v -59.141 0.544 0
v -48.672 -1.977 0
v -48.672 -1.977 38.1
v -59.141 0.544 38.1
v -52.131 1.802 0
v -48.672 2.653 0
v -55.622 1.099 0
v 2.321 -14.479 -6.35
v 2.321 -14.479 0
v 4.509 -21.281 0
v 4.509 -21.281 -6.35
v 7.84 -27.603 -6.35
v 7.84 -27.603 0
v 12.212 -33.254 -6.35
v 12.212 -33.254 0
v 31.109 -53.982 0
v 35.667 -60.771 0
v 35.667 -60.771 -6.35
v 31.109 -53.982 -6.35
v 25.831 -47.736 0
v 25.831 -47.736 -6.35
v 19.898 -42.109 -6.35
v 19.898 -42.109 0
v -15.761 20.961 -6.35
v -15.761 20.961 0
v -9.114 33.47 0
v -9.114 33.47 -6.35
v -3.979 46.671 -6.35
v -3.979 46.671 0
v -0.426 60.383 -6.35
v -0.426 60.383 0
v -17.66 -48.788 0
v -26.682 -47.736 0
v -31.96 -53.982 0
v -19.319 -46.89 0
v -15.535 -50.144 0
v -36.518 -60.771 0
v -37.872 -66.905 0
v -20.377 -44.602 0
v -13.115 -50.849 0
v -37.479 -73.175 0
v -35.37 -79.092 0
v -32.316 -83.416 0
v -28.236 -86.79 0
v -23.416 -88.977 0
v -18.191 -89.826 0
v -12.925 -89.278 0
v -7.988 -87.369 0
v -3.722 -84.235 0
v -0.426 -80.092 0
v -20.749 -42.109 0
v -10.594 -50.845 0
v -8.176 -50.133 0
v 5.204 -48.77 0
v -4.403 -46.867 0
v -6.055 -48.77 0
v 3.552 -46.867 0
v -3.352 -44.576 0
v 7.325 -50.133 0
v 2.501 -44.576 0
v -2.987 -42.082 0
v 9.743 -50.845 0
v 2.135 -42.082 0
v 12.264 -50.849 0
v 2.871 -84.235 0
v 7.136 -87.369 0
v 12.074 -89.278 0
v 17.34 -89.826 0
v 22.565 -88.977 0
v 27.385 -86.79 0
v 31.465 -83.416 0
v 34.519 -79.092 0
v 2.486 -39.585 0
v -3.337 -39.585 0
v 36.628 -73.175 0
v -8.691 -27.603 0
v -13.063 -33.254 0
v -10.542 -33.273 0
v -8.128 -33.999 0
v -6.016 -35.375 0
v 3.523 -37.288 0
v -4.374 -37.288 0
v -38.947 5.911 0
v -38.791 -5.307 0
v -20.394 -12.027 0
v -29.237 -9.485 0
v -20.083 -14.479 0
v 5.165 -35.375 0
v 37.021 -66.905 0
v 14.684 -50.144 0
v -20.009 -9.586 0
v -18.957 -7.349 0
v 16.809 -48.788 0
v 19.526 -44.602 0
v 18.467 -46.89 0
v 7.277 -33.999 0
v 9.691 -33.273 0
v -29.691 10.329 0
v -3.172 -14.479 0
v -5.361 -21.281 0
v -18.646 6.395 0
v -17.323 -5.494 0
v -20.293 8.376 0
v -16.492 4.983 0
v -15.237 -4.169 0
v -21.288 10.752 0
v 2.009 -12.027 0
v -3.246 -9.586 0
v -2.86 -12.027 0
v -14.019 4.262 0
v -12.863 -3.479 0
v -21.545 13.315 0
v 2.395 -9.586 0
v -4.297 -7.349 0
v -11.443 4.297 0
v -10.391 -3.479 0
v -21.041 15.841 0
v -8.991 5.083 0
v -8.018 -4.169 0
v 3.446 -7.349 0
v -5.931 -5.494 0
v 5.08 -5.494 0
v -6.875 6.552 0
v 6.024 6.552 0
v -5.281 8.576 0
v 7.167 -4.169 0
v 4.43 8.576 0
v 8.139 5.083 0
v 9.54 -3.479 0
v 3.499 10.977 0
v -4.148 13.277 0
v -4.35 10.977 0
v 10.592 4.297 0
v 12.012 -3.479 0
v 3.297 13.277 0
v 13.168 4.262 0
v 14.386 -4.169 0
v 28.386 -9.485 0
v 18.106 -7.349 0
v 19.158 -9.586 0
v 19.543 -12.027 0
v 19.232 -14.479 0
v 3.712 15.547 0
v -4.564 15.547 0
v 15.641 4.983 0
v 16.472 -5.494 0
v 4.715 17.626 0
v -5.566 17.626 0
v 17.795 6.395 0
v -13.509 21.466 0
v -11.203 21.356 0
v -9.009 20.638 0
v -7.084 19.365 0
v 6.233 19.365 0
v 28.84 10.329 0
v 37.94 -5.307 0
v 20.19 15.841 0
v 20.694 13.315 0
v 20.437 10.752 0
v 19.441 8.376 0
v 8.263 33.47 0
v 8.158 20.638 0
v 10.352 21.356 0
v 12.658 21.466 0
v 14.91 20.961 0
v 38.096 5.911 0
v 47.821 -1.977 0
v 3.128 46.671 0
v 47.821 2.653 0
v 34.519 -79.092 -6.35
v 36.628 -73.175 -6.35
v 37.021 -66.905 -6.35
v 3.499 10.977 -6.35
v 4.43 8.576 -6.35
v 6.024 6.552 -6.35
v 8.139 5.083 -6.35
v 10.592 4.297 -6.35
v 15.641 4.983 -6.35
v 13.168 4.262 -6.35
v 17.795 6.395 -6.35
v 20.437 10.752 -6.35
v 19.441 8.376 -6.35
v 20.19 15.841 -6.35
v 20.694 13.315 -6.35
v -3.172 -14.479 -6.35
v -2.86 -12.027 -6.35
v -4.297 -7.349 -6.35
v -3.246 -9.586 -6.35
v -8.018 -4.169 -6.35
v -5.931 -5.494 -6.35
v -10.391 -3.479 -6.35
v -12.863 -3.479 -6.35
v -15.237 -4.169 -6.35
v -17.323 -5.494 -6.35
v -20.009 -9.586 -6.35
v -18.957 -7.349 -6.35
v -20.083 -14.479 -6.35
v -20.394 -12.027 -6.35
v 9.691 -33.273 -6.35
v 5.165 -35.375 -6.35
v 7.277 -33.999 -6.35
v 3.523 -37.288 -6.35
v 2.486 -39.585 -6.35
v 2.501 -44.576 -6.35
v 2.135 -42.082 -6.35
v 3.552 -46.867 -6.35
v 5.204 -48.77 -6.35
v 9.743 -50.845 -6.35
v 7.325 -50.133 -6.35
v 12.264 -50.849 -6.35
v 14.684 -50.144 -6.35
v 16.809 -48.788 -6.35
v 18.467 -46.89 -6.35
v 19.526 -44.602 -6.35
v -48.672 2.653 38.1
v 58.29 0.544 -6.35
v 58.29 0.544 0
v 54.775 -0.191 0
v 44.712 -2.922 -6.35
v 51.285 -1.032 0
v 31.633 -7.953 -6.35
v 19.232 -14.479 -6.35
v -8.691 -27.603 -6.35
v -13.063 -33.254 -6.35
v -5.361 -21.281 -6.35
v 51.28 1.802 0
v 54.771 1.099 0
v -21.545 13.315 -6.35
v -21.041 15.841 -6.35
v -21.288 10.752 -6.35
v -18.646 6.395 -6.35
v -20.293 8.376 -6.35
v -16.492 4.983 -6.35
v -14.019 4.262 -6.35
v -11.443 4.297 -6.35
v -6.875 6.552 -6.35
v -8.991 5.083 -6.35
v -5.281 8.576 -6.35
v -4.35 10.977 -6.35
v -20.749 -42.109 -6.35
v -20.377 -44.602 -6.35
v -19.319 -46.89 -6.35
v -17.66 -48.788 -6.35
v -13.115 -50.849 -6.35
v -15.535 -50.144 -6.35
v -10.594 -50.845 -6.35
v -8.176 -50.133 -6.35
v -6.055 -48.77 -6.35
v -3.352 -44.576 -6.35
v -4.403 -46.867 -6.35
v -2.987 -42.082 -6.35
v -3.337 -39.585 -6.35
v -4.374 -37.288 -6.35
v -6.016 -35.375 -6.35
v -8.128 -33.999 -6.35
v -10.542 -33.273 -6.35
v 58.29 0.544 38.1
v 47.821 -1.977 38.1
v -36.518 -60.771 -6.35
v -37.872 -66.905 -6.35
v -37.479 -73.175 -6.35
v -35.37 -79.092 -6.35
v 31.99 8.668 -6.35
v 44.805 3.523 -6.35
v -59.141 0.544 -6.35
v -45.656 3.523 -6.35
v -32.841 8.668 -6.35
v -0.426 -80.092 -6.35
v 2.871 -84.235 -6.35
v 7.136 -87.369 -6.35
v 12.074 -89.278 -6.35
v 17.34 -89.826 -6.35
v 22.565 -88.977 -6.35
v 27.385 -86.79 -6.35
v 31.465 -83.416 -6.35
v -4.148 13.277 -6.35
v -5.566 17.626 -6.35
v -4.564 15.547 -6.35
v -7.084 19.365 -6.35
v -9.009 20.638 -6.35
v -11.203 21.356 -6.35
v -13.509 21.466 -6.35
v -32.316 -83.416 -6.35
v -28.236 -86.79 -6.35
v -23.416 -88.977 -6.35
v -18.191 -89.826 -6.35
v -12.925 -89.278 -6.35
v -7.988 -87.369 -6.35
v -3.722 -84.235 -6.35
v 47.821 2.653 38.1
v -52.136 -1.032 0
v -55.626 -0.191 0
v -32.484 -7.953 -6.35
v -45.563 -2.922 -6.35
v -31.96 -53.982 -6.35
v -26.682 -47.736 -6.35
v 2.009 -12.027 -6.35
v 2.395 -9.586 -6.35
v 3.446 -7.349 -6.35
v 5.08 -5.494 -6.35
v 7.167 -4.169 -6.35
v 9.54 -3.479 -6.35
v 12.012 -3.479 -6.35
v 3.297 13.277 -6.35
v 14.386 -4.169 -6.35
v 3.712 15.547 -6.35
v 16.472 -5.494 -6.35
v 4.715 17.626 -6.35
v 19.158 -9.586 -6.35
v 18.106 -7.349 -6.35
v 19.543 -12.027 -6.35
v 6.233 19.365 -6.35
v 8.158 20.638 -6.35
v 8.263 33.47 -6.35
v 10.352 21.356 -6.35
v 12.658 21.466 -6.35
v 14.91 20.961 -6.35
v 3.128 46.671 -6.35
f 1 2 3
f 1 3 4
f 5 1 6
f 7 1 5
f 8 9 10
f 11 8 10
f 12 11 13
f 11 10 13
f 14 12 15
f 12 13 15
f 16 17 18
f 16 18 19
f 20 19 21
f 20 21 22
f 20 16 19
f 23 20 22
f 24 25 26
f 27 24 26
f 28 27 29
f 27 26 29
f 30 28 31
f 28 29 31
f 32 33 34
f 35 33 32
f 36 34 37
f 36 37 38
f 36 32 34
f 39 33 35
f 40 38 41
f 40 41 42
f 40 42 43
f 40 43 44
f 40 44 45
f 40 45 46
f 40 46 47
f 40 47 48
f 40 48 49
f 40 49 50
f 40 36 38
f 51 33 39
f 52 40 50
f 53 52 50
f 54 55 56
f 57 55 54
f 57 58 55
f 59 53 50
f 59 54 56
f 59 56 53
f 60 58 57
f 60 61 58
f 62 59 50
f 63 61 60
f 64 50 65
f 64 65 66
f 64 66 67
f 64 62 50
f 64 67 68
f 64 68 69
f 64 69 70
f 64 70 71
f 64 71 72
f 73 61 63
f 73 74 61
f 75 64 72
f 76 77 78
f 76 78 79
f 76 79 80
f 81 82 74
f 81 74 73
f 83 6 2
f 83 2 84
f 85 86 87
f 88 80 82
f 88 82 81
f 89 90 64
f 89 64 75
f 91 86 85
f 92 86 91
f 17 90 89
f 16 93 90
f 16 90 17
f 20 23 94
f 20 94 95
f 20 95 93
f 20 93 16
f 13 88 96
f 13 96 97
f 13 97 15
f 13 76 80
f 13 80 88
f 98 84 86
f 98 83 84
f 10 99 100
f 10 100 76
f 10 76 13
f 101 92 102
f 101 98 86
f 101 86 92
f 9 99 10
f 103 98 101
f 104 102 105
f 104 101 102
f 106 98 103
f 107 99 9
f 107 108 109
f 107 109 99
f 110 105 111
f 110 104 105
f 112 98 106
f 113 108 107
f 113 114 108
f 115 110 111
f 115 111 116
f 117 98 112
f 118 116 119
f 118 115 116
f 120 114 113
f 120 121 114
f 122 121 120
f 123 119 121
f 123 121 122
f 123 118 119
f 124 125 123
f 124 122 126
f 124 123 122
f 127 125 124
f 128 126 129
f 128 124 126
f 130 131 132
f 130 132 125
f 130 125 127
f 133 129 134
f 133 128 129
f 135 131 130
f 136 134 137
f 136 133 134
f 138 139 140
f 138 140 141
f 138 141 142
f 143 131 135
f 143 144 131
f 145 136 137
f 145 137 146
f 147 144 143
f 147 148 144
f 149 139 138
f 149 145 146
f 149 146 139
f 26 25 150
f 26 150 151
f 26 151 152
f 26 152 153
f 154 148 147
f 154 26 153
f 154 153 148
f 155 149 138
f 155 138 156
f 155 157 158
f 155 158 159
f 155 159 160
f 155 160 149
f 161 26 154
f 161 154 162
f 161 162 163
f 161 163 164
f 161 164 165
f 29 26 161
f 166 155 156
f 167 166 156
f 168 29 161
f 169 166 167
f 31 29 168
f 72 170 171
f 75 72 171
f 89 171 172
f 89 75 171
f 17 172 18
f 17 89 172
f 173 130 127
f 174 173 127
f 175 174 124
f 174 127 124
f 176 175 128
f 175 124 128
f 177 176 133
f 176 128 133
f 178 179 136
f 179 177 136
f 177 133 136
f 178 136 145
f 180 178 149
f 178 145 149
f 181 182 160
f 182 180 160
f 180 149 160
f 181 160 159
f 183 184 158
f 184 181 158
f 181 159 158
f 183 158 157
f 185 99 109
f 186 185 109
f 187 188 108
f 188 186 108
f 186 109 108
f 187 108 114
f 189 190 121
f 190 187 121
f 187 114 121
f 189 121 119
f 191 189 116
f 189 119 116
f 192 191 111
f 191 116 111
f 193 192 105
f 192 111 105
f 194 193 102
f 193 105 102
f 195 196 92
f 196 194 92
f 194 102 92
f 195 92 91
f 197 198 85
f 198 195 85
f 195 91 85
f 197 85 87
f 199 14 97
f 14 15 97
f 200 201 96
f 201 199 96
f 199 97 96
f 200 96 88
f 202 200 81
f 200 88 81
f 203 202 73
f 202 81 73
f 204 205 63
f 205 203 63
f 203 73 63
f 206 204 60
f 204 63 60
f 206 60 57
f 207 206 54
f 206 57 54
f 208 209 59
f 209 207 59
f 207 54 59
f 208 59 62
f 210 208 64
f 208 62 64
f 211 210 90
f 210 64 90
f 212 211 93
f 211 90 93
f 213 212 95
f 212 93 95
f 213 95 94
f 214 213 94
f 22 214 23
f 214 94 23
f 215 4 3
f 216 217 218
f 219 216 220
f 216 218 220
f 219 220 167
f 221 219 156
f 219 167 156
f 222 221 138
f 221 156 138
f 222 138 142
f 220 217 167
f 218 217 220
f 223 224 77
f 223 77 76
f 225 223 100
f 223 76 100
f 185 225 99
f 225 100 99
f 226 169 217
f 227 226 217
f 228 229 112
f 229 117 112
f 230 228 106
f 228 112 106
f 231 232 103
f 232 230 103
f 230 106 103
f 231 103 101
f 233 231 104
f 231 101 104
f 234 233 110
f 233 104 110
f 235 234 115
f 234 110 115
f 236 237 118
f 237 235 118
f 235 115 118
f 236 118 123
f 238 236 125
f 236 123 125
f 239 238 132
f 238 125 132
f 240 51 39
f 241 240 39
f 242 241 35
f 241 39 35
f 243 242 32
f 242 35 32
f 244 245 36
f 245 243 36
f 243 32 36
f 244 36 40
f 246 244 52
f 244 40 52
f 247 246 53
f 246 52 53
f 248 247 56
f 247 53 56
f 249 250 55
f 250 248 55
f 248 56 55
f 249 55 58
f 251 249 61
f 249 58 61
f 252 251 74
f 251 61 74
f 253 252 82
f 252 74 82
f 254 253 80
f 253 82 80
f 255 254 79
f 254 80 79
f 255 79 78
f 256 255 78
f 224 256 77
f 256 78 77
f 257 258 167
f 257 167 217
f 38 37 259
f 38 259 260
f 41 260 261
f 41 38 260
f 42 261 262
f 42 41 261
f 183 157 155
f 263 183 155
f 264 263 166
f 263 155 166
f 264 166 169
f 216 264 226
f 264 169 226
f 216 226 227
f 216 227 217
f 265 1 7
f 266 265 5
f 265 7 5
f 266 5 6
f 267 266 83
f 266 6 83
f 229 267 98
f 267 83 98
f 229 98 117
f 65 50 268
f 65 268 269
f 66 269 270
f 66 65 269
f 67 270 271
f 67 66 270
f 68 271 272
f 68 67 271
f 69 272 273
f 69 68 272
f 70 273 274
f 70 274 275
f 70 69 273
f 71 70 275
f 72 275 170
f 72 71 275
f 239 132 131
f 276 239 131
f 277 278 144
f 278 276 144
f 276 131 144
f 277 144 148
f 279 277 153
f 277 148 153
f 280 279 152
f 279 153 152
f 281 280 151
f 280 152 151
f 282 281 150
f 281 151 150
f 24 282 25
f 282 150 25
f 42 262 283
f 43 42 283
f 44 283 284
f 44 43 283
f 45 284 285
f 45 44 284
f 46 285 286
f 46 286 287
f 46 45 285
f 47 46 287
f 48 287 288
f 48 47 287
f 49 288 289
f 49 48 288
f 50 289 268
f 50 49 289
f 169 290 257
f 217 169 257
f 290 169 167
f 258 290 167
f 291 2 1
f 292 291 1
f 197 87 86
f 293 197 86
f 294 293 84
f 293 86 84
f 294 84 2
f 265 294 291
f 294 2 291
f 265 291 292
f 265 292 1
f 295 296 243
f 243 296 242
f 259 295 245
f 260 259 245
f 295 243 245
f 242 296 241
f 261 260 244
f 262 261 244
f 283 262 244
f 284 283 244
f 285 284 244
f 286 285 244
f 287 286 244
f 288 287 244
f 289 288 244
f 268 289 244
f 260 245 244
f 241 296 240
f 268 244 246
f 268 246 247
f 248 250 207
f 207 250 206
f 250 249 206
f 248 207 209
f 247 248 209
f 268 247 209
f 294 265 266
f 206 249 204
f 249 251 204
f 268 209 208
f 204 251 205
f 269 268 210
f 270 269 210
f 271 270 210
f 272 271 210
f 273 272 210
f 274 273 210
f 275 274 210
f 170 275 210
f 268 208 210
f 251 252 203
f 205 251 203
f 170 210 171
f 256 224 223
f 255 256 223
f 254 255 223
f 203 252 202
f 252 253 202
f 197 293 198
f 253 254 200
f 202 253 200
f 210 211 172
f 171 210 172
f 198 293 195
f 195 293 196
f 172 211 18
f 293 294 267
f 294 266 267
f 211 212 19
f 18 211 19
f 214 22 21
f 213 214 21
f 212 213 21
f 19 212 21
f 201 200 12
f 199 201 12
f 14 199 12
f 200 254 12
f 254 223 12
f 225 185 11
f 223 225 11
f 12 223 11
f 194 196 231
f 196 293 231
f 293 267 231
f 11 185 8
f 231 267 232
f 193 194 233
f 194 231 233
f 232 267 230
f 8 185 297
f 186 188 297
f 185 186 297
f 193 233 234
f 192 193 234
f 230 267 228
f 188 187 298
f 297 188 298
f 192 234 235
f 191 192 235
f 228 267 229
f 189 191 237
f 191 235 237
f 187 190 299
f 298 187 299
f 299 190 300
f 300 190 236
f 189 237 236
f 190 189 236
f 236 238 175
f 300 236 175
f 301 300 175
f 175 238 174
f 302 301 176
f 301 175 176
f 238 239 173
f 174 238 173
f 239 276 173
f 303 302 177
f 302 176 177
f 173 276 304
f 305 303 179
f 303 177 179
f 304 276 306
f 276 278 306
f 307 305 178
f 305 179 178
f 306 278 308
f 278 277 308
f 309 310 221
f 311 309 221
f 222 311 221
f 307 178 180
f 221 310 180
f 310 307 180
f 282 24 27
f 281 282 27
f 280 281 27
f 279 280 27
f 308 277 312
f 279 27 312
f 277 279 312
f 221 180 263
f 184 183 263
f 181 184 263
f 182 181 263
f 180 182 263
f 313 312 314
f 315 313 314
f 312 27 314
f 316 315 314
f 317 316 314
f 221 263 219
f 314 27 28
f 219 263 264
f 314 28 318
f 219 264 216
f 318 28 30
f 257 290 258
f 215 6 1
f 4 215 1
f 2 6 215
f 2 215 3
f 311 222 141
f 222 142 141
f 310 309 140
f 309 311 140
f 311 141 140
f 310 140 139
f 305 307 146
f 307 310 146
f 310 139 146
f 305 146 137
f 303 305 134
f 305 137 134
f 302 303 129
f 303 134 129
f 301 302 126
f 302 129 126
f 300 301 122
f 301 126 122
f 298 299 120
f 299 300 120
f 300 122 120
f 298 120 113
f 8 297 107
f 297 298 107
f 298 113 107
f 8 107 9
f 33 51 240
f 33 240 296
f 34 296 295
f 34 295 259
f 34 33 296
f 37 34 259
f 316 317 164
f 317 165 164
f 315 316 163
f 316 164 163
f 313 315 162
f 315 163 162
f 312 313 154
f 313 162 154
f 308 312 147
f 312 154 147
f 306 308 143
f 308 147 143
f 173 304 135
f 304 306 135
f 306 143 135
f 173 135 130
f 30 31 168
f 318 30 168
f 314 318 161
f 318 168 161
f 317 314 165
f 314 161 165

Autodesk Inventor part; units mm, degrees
sketch "Sketch1" plane through (0, 0, 0) normal (0, 0, 1) x (1, 0, 0)
  line L0 (-63.346699, 63.7292) -> (61.928792, 63.7292) construction
  line L1 (61.928792, 63.7292) -> (61.928792, -93.080155) construction
  line L2 (61.928792, -93.080155) -> (-63.346699, -93.080155) construction
  line L3 (-63.346699, -93.080155) -> (-63.346699, 63.7292) construction
  line L4 (-0.42552, 162.447522) -> (-0.42552, -218.552478) construction
  line L5 (-278.922376, 0) -> (102.077624, 0) construction
  line L6 (-278.922376, 0) -> (-0.42552, 162.447522) construction
  arc A0 (58.289512, 0.544173) -> (19.231751, -14.479084) centre (81.029762, -116.85958) ccw
  arc A1 (20.189512, 15.840755) -> (58.289512, 0.544173) centre (69.634217, 83.898154) ccw
  arc A2 (3.498748, 10.977204) -> (20.189512, 15.840755) centre (11.994733, 12.892137) ccw
  arc A3 (14.909713, 20.960899) -> (3.498748, 10.977204) centre (11.912504, 12.873603) ccw
  arc A4 (-0.42552, 60.383117) -> (14.909713, 20.960899) centre (117.977264, 83.747962) ccw
  arc A5 (-20.082792, -14.479084) -> (-59.140553, 0.544173) centre (-81.880803, -116.85958) ccw
  arc A6 (-59.140553, 0.544173) -> (-21.040553, 15.840755) centre (-70.485258, 83.898154) ccw
  arc A7 (-21.040553, 15.840755) -> (-4.349789, 10.977204) centre (-12.845774, 12.892137) ccw
  arc A8 (-4.349789, 10.977204) -> (-15.760754, 20.960899) centre (-12.763545, 12.873603) ccw
  arc A9 (-15.760754, 20.960899) -> (-0.42552, 60.383117) centre (-118.828305, 83.747962) ccw
  arc A10 (-3.171758, -14.479084) -> (-20.082792, -14.479084) centre (-11.627275, -12.159576) ccw
  arc A11 (-20.749333, -42.108587) -> (-13.062786, -33.254463) centre (-11.867981, -42.055242) ccw
  arc A12 (-13.062786, -33.254463) -> (-3.171758, -14.479084) centre (-43.362152, -5.299473) ccw
  arc A13 (-35.369694, -79.091841) -> (-0.42552, -80.092171) centre (-17.617152, -69.794979) ccw
  arc A14 (-36.518332, -60.771084) -> (-35.369694, -79.091841) centre (-15.42074, -68.644735) ccw
  arc A15 (-20.749333, -42.108587) -> (-36.518332, -60.771084) centre (27.274466, -98.679918) ccw
  arc A16 (19.231751, -14.479084) -> (2.320717, -14.479084) centre (10.776234, -12.159576) ccw
  arc A17 (12.211745, -33.254463) -> (19.898292, -42.108587) centre (11.01694, -42.055242) ccw
  arc A18 (2.320717, -14.479084) -> (12.211745, -33.254463) centre (42.511111, -5.299473) ccw
  arc A19 (-0.42552, -80.092171) -> (34.518653, -79.091841) centre (16.766111, -69.794979) ccw
  arc A20 (34.518653, -79.091841) -> (35.667291, -60.771084) centre (14.569699, -68.644735) ccw
  arc A21 (35.667291, -60.771084) -> (19.898292, -42.108587) centre (-28.125507, -98.679918) ccw
  arc A22 (14.617916, 21.196775) -> (3.374856, 10.94928) centre (11.912504, 12.873603) ccw
  arc A23 (3.374856, 10.94928) -> (20.435276, 15.506372) centre (11.994733, 12.892137) ccw
  arc A24 (20.435276, 15.506372) -> (57.52626, 0.523283) centre (69.634217, 83.898154) ccw
  arc A25 (57.52626, 0.523283) -> (19.431403, -14.210696) centre (81.029762, -116.85958) ccw
  arc A26 (19.431403, -14.210696) -> (2.197514, -14.510029) centre (10.776234, -12.159576) ccw
  arc A27 (2.197514, -14.510029) -> (11.888162, -33.088957) centre (42.511111, -5.299473) ccw
  arc A28 (11.888162, -33.088957) -> (20.019639, -42.378822) centre (11.01694, -42.055242) ccw
  arc A29 (35.552285, -60.826156) -> (20.019639, -42.378822) centre (-28.125507, -98.679918) ccw
  arc A30 (34.406147, -79.032922) -> (35.552285, -60.826156) centre (14.569699, -68.644735) ccw
  arc A31 (-0.42552, -79.842777) -> (34.406147, -79.032922) centre (16.766111, -69.794979) ccw
  arc A32 (-35.257188, -79.032922) -> (-0.42552, -79.842777) centre (-17.617152, -69.794979) ccw
  arc A33 (-36.403326, -60.826156) -> (-35.257188, -79.032922) centre (-15.42074, -68.644735) ccw
  arc A34 (-20.87068, -42.378822) -> (-36.403326, -60.826156) centre (27.274466, -98.679918) ccw
  arc A35 (-20.87068, -42.378822) -> (-12.739203, -33.088957) centre (-11.867981, -42.055242) ccw
  arc A36 (-12.739203, -33.088957) -> (-3.048555, -14.510029) centre (-43.362152, -5.299473) ccw
  arc A37 (-3.048555, -14.510029) -> (-20.282444, -14.210696) centre (-11.627275, -12.159576) ccw
  arc A38 (-20.282444, -14.210696) -> (-58.377301, 0.523283) centre (-81.880803, -116.85958) ccw
  arc A39 (-58.377301, 0.523283) -> (-21.286317, 15.506372) centre (-70.485258, 83.898154) ccw
  arc A40 (-21.286317, 15.506372) -> (-4.225897, 10.94928) centre (-12.845774, 12.892137) ccw
  arc A41 (-4.225897, 10.94928) -> (-15.468957, 21.196775) centre (-12.763545, 12.873603) ccw
  arc A42 (-15.468957, 21.196775) -> (-0.42552, 59.735749) centre (-118.828305, 83.747962) ccw
  arc A43 (-0.42552, 59.735749) -> (14.617916, 21.196775) centre (117.977264, 83.747962) ccw
  arc A44 (2.631504, 10.781734) -> (21.550603, 13.791702) centre (11.994733, 12.892137) ccw
  arc A45 (13.063953, 22.317492) -> (2.631504, 10.781734) centre (11.912504, 12.873603) ccw
  arc A46 (-0.42552, 56.156547) -> (13.063953, 22.317492) centre (117.977264, 83.747962) ccw
  arc A47 (-13.914994, 22.317492) -> (-0.42552, 56.156547) centre (-118.828305, 83.747962) ccw
  arc A48 (-3.482545, 10.781734) -> (-13.914994, 22.317492) centre (-12.763545, 12.873603) ccw
  arc A49 (-22.401644, 13.791702) -> (-3.482545, 10.781734) centre (-12.845774, 12.892137) ccw
  arc A50 (-54.360773, 0.4299) -> (-22.401644, 13.791702) centre (-70.485258, 83.898154) ccw
  arc A51 (-21.26647, -12.743891) -> (-54.360773, 0.4299) centre (-81.880803, -116.85958) ccw
  arc A52 (-2.309275, -14.695398) -> (-21.26647, -12.743891) centre (-11.627275, -12.159576) ccw
  arc A53 (-11.05737, -32.318413) -> (-2.309275, -14.695398) centre (-43.362152, -5.299473) ccw
  arc A54 (-21.461702, -43.905491) -> (-11.05737, -32.318413) centre (-11.867981, -42.055242) ccw
  arc A55 (-21.461702, -43.905491) -> (-35.713006, -61.156188) centre (27.274466, -98.679918) ccw
  arc A56 (-35.713006, -61.156188) -> (-34.582151, -78.679411) centre (-15.42074, -68.644735) ccw
  arc A57 (-34.582151, -78.679411) -> (-0.42552, -78.232522) centre (-17.617152, -69.794979) ccw
  arc A58 (-0.42552, -78.232522) -> (33.731111, -78.679411) centre (16.766111, -69.794979) ccw
  arc A59 (33.731111, -78.679411) -> (34.861965, -61.156188) centre (14.569699, -68.644735) ccw
  arc A60 (34.861965, -61.156188) -> (20.610662, -43.905491) centre (-28.125507, -98.679918) ccw
  arc A61 (10.206329, -32.318413) -> (20.610662, -43.905491) centre (11.01694, -42.055242) ccw
  arc A62 (1.458234, -14.695398) -> (10.206329, -32.318413) centre (42.511111, -5.299473) ccw
  arc A63 (20.415429, -12.743891) -> (1.458234, -14.695398) centre (10.776234, -12.159576) ccw
  arc A64 (53.509732, 0.4299) -> (20.415429, -12.743891) centre (81.029762, -116.85958) ccw
  arc A65 (21.550603, 13.791702) -> (53.509732, 0.4299) centre (69.634217, 83.898154) ccw
  point P0 (0, 0)
  point P1 (-15.887651, 20.960899)
  point P2 (3.820531, 5.071329)
  dimension "d3" = 381
  dimension "d6" = 381
  dimension "d11" = 38.1
  dimension "d18" = 0.127
  dimension "d19" = 0.762
sketch "Sketch1 outline for Extrusion1" plane through (0, 0, 0) normal (0, 0, 1) x (1, 0, 0)
  arc A0 (-20.749333, -42.108587) -> (-36.518332, -60.771084) centre (27.274466, -98.679918) ccw
  arc A1 (-13.062786, -33.254463) -> (-20.749333, -42.108587) centre (-11.867981, -42.055242) cw
  arc A2 (-3.171758, -14.479084) -> (-13.062786, -33.254463) centre (-43.362152, -5.299473) cw
  arc A3 (-20.082792, -14.479084) -> (-3.171758, -14.479084) centre (-11.627275, -12.159576) cw
  arc A4 (-59.140553, 0.544173) -> (-20.082792, -14.479084) centre (-81.880803, -116.85958) cw
  arc A5 (-21.040553, 15.840755) -> (-59.140553, 0.544173) centre (-70.485258, 83.898154) cw
  arc A6 (-4.349789, 10.977204) -> (-21.040553, 15.840755) centre (-12.845774, 12.892137) cw
  arc A7 (-15.760754, 20.960899) -> (-4.349789, 10.977204) centre (-12.763545, 12.873603) cw
  arc A8 (-0.42552, 60.383117) -> (-15.760754, 20.960899) centre (-118.828305, 83.747962) cw
  arc A9 (14.909713, 20.960899) -> (-0.42552, 60.383117) centre (117.977264, 83.747962) cw
  arc A10 (3.498748, 10.977204) -> (14.909713, 20.960899) centre (11.912504, 12.873603) cw
  arc A11 (20.189512, 15.840755) -> (3.498748, 10.977204) centre (11.994733, 12.892137) cw
  arc A12 (58.289512, 0.544173) -> (20.189512, 15.840755) centre (69.634217, 83.898154) cw
  arc A13 (19.231751, -14.479084) -> (58.289512, 0.544173) centre (81.029762, -116.85958) cw
  arc A14 (2.320717, -14.479084) -> (19.231751, -14.479084) centre (10.776234, -12.159576) cw
  arc A15 (12.211745, -33.254463) -> (2.320717, -14.479084) centre (42.511111, -5.299473) cw
  arc A16 (19.898292, -42.108587) -> (12.211745, -33.254463) centre (11.01694, -42.055242) cw
  arc A17 (35.667291, -60.771084) -> (19.898292, -42.108587) centre (-28.125507, -98.679918) ccw
  arc A18 (34.518653, -79.091841) -> (35.667291, -60.771084) centre (14.569699, -68.644735) ccw
  arc A19 (-0.42552, -80.092171) -> (34.518653, -79.091841) centre (16.766111, -69.794979) ccw
  arc A20 (-35.369694, -79.091841) -> (-0.42552, -80.092171) centre (-17.617152, -69.794979) ccw
  arc A21 (-36.518332, -60.771084) -> (-35.369694, -79.091841) centre (-15.42074, -68.644735) ccw
extrude "Extrusion1" add sketch "Sketch1 outline for Extrusion1" against normal blind 6.35
sketch "Sketch2" plane through (0, 0, 0) normal (0, 1, 0) x (-1, 0, 0)
  point P0 (0, 0)
sketch "Sketch3" plane through (0, 0, 0) normal (0, 0, 1) x (1, 0, 0)
  arc A0 (20.189512, 15.840755) -> (58.289512, 0.544173) centre (69.634217, 83.898154) ccw
  arc A1 (58.289512, 0.544173) -> (19.231751, -14.479084) centre (81.029762, -116.85958) ccw
  line L0 (47.821262, 2.652948) -> (47.821262, -1.977224)
  line L1 (47.821262, -1.977224) -> (58.289512, 0.544173)
  line L2 (47.821262, 2.652948) -> (58.289512, 0.544173)
  arc A2 (-0.42552, 60.383117) -> (14.909713, 20.960899) centre (117.977264, 83.747962) ccw construction
  line L3 (-0.42552, 60.383117) -> (-0.42552, -89.381829) construction
  line L4 (-48.672303, 2.652948) -> (-48.672303, -1.977224)
  line L5 (-48.672303, -1.977224) -> (-59.140553, 0.544173)
  line L6 (-48.672303, 2.652948) -> (-59.140553, 0.544173)
  point P0 (0, 0)
extrude "Extrusion2" add sketch "Sketch3" along normal blind 38.1
sketch "Sketch4" plane through (0, 0, 0) normal (1, 0, 0) x (0, 1, 0)
  line L0 (0.544173, 0) -> (0.544173, 38.1)
  point P0 (0, 0)
sketch "Sketch5" plane through (0, 0, 0) normal (0, 1, 0) x (-1, 0, 0)
  point P0 (0, 0)
  point P1 (0, 12.7)
sketch "Sketch6" plane through (0, 0, -6.35) normal (0, 0, -1) x (-1, 0, 0)
  point P0 (0, 0)
properties part number "Nobody Emblem Ring"
